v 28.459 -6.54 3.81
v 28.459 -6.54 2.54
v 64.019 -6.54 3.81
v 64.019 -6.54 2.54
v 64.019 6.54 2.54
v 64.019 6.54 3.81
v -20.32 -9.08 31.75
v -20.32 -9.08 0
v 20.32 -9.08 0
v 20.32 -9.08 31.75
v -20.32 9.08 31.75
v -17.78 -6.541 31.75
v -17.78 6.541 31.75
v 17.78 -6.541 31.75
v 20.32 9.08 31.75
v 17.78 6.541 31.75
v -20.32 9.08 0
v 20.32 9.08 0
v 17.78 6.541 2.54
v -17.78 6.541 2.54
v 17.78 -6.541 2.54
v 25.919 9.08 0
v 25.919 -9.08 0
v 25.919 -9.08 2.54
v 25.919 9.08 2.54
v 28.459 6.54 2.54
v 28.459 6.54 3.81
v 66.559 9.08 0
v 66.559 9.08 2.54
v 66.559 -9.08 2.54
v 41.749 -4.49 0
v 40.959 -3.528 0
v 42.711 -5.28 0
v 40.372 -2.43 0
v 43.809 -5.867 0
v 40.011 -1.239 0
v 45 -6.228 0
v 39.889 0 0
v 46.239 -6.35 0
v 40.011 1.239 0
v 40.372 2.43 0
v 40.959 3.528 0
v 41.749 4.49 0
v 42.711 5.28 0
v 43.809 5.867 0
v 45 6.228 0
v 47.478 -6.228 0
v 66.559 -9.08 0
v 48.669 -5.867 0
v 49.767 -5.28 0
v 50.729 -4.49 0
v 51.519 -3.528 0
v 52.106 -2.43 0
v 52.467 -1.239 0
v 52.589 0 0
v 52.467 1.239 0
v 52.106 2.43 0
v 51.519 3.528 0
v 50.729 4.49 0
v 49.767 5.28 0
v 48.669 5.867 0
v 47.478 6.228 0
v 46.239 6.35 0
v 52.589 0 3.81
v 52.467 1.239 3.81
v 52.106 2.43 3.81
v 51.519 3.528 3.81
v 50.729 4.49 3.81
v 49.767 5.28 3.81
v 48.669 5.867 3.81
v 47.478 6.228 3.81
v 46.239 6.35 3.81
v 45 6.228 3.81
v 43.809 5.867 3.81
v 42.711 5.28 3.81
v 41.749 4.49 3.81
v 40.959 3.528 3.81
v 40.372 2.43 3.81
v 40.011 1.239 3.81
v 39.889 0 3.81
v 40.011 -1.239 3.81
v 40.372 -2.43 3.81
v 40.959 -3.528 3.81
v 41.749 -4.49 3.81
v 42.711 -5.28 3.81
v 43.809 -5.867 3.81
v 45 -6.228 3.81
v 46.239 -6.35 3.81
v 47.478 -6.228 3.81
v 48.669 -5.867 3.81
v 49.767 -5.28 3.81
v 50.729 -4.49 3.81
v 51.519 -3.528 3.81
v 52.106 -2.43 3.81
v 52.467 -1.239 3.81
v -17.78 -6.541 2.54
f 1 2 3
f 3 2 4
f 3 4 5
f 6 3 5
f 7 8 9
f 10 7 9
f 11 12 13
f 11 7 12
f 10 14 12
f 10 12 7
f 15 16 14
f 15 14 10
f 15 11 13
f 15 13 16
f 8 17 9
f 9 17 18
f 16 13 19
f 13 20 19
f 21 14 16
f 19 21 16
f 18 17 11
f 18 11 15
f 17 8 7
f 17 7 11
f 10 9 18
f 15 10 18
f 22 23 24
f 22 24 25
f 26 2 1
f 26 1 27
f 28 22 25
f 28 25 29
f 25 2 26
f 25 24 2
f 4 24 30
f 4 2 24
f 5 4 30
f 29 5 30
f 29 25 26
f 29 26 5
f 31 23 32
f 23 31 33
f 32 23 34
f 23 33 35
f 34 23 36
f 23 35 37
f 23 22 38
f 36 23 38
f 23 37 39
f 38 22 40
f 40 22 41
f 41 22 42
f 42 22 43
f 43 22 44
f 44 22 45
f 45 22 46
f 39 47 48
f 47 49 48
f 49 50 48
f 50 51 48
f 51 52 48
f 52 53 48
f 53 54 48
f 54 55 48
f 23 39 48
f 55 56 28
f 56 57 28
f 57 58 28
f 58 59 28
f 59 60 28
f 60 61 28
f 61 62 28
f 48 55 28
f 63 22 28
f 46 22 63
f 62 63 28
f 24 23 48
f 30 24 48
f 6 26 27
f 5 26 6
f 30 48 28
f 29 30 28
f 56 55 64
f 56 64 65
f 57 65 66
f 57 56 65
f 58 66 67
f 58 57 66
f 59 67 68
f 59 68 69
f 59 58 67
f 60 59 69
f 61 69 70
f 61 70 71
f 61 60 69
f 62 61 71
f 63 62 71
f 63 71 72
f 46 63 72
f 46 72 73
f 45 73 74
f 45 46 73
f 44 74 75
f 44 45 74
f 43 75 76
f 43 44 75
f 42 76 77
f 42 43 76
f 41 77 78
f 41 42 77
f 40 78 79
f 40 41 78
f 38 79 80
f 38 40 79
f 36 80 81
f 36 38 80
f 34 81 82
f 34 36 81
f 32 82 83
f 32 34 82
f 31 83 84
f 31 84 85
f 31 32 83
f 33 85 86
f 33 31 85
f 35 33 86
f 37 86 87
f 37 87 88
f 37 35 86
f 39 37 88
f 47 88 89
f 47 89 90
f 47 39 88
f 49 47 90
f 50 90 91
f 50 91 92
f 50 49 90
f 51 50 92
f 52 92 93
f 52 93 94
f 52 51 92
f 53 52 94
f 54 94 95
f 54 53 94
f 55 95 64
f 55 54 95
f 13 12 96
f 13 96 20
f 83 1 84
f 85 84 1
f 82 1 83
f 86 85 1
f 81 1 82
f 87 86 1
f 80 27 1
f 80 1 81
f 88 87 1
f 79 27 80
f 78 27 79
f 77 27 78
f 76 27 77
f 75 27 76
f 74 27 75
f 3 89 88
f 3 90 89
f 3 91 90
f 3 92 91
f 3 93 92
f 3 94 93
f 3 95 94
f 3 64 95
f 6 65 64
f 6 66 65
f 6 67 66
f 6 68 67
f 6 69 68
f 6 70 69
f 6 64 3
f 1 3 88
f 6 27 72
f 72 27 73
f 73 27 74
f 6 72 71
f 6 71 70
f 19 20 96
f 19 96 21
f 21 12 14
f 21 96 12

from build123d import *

# Parameters (mm, degrees)
F0_W     = 40.64
F0_H     = 18.161
F1_DEPTH = 31.75
F2_T     = -2.54
F3_W     = 40.64
F3_H     = 18.161
F3_W_2   = 35.56
F3_H_2   = 13.081
F4_DEPTH = 2.54
F3_R     = 6.35
F5_DEPTH = 3.81


with BuildPart() as f1:
    # F0 (on Top) → F1 (new body)
    with BuildSketch(Plane.XY):
        Rectangle(F0_W, F0_H)
    extrude(amount=F1_DEPTH)

    # F2
    f2_openings = [f1.faces().sort_by_distance(p)[0] for p in [
        (0, 0, 31.75),
    ]]
    offset(amount=F2_T, openings=f2_openings)


with BuildPart() as f4:
    # F3 (on Top) → F4 (new body)
    with BuildSketch(Plane.XY):
        with Locations((46.239112, 0)):
            Rectangle(F3_W, F3_H)
        with Locations((46.239112, 0)):
            Rectangle(F3_W_2, F3_H_2, mode=Mode.SUBTRACT)
    extrude(amount=F4_DEPTH)

    # F3 (on Top) → F5 (join)
    with BuildSketch(Plane.XY):
        with Locations((46.239112, 0)):
            Rectangle(F3_W_2, F3_H_2)
        with Locations((46.239112, 0)):
            Circle(F3_R, mode=Mode.SUBTRACT)
    extrude(amount=F5_DEPTH)


solid = Compound([f1.part, f4.part])
